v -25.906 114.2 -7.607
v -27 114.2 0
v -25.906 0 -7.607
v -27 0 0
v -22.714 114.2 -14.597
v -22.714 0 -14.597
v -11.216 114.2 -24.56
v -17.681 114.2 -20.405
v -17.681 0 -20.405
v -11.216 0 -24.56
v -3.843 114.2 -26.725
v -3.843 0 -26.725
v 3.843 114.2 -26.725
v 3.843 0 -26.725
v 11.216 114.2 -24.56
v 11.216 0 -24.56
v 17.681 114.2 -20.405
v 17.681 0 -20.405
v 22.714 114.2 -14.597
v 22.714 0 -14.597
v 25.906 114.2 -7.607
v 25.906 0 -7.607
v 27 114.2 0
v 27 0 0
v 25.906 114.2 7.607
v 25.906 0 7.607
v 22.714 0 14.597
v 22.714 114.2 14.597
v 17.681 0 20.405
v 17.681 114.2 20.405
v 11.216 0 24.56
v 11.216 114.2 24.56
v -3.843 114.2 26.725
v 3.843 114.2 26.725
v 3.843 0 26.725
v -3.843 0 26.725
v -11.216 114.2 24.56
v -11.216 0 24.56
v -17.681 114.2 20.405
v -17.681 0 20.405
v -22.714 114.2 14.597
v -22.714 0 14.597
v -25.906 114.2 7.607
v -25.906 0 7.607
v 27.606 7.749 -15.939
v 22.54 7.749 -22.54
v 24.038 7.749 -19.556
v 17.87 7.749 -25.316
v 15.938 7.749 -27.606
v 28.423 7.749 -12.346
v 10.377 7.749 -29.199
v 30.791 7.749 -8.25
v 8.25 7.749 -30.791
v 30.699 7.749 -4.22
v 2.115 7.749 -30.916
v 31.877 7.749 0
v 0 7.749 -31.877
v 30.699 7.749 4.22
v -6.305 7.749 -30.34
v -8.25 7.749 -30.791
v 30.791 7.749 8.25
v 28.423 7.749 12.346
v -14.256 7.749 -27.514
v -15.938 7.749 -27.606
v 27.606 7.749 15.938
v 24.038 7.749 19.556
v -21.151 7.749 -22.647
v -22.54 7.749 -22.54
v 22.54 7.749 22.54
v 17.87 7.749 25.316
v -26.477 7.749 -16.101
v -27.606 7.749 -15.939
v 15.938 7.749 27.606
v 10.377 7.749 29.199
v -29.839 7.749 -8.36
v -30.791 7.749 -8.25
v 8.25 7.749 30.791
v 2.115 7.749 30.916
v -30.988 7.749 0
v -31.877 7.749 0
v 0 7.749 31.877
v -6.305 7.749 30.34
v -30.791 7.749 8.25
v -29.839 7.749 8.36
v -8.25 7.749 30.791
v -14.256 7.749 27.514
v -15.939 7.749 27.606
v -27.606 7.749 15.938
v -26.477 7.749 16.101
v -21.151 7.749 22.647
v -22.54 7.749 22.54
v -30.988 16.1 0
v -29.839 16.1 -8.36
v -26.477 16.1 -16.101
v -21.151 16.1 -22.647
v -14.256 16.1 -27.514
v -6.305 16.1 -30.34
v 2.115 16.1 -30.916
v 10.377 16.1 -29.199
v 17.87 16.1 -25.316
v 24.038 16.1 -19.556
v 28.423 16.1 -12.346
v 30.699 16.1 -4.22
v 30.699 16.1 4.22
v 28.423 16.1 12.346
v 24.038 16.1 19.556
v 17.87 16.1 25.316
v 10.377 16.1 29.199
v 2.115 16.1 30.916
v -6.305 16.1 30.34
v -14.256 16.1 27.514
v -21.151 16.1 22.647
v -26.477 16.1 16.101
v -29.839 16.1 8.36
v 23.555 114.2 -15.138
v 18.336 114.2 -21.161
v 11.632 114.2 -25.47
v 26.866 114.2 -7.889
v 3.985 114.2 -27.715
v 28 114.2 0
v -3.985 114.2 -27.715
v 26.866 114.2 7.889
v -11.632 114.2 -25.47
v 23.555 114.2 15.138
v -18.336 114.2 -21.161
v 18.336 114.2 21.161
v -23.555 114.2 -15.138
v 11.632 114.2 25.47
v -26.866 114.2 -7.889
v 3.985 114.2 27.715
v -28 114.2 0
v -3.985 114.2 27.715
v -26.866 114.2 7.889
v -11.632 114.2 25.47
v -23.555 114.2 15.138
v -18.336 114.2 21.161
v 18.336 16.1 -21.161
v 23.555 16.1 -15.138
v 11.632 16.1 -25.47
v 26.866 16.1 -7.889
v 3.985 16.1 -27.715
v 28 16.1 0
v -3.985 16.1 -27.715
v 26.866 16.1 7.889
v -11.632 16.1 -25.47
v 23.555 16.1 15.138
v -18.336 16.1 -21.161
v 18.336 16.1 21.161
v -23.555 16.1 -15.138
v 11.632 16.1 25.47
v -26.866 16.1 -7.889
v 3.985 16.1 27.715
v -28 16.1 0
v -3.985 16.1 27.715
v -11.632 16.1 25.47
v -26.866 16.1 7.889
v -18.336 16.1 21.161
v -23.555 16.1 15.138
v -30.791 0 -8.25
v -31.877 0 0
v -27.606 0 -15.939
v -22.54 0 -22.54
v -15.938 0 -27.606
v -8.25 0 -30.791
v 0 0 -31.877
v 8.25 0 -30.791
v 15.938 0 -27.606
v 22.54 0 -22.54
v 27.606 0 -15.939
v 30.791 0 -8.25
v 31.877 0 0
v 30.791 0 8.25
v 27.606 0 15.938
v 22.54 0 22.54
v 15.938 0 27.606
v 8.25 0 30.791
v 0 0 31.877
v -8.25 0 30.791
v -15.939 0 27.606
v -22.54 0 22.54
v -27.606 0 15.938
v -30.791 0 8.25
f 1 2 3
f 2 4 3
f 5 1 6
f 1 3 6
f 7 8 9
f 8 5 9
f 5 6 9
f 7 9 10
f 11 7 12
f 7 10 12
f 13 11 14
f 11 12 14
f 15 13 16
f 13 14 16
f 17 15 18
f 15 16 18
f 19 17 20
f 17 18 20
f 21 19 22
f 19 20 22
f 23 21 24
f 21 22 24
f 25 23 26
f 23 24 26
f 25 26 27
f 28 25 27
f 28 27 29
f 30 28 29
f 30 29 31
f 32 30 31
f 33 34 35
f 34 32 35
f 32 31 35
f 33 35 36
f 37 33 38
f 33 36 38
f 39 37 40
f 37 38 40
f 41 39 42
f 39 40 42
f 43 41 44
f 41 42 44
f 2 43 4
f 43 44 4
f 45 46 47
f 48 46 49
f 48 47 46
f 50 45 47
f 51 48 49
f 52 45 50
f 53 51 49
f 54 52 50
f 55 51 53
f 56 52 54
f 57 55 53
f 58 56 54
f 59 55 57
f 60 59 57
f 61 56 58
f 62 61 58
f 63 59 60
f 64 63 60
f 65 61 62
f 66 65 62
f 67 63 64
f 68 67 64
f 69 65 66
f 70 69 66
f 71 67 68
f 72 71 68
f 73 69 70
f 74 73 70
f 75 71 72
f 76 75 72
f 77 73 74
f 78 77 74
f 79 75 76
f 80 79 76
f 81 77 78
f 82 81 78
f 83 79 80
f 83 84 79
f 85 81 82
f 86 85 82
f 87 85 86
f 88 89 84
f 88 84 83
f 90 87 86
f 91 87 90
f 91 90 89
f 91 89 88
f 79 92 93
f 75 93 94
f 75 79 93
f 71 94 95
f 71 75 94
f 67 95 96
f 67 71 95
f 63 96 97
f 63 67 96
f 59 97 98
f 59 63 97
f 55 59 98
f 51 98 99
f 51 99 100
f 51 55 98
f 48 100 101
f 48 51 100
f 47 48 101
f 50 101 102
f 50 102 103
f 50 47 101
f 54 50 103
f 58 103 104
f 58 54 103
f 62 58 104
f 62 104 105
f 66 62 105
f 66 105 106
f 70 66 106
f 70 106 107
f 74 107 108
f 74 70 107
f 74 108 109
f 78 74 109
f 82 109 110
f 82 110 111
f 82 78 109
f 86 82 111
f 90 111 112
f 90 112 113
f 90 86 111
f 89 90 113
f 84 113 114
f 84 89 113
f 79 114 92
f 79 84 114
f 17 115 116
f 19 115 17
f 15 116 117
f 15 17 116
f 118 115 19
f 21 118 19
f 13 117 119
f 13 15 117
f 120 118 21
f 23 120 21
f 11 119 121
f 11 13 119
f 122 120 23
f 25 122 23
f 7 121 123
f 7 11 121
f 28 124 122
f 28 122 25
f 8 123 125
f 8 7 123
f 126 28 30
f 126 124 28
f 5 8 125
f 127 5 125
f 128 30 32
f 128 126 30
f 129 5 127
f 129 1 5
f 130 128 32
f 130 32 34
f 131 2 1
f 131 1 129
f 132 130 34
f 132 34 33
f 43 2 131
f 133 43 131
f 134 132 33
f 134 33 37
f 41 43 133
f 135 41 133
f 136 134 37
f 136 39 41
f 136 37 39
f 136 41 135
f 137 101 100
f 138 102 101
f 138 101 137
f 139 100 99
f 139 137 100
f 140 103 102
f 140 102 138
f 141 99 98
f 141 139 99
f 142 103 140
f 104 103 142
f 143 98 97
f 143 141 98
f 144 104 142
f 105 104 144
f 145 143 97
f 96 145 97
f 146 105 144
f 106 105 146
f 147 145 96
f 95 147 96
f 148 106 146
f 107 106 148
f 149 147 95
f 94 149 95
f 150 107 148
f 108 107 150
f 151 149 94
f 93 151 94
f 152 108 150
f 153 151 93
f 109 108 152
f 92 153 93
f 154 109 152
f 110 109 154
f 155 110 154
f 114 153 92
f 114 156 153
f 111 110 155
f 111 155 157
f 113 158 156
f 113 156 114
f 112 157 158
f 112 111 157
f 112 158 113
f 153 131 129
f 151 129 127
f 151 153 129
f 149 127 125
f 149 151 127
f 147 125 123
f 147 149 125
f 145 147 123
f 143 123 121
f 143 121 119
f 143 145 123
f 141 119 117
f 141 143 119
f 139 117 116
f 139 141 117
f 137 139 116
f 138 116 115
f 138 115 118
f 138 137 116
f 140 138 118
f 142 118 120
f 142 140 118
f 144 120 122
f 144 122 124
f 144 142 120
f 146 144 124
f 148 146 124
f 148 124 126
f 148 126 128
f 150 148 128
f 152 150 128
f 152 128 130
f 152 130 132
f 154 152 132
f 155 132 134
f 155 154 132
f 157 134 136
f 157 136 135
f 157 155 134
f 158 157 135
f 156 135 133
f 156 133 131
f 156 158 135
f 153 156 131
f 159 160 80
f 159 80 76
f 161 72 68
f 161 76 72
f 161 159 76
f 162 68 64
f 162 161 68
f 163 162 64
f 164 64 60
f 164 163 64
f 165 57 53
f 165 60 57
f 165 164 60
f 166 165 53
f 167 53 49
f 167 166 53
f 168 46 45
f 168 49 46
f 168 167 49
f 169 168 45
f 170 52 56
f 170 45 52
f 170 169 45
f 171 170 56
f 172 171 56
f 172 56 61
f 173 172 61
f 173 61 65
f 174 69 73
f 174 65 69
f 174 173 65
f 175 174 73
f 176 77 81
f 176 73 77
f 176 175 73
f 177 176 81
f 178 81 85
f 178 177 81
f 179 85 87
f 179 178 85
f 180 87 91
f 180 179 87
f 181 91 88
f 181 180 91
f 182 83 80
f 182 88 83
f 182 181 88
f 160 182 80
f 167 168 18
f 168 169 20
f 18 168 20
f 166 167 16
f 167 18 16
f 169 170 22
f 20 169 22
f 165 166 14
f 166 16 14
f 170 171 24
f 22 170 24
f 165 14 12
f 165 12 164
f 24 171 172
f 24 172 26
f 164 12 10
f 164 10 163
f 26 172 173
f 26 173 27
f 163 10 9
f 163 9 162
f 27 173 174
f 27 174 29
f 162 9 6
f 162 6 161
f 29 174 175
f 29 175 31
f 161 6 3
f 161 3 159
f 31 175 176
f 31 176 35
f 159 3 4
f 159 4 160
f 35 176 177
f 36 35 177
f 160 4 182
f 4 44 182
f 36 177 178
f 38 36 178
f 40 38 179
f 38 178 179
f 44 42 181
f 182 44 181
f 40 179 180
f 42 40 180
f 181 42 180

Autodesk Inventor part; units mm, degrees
sketch "Sketch1" plane through (0, 0, 0) normal (0, 1, 0) x (-1, 0, 0)
  circle A0 centre (0, 0) radius 27
  circle A1 centre (0, 0) radius 31.877
  dimension "d0" = 54
  dimension "d1" = 63.754
extrude "Extrusion1" add sketch "Sketch1" along normal blind 114.2
ref_plane "Work Plane1" through (0, 7.749, 0) normal (0, 1, 0) x (-1, 0, 0)
sketch "Sketch3" plane through (0, 7.749, 0) normal (0, 1, 0) x (-1, 0, 0)
  circle A0 centre (0, 0) radius 31.877
  circle A1 centre (0, 0) radius 30.988
  dimension "d6" = 61.976
extrude "Extrusion2" cut sketch "Sketch3" along normal blind 200
ref_plane "Work Plane2" through (0, 16.1, 0) normal (0, 1, 0) x (-1, 0, 0)
sketch "Sketch4" plane through (0, 16.1, 0) normal (0, 1, 0) x (-1, 0, 0)
  circle A0 centre (0, 0) radius 28
  circle A1 centre (0, 0) radius 26.4727
  circle A2 centre (0, 0) radius 31.5514
  dimension "d10" = 56
extrude "Extrusion3" cut sketch "Sketch4" along normal blind 200 contours A2
ref_plane "Work Plane3" through (0, 113.3, 0) normal (0, 1, 0) x (-1, 0, 0)
properties part number "Vacuum Cylinder"
